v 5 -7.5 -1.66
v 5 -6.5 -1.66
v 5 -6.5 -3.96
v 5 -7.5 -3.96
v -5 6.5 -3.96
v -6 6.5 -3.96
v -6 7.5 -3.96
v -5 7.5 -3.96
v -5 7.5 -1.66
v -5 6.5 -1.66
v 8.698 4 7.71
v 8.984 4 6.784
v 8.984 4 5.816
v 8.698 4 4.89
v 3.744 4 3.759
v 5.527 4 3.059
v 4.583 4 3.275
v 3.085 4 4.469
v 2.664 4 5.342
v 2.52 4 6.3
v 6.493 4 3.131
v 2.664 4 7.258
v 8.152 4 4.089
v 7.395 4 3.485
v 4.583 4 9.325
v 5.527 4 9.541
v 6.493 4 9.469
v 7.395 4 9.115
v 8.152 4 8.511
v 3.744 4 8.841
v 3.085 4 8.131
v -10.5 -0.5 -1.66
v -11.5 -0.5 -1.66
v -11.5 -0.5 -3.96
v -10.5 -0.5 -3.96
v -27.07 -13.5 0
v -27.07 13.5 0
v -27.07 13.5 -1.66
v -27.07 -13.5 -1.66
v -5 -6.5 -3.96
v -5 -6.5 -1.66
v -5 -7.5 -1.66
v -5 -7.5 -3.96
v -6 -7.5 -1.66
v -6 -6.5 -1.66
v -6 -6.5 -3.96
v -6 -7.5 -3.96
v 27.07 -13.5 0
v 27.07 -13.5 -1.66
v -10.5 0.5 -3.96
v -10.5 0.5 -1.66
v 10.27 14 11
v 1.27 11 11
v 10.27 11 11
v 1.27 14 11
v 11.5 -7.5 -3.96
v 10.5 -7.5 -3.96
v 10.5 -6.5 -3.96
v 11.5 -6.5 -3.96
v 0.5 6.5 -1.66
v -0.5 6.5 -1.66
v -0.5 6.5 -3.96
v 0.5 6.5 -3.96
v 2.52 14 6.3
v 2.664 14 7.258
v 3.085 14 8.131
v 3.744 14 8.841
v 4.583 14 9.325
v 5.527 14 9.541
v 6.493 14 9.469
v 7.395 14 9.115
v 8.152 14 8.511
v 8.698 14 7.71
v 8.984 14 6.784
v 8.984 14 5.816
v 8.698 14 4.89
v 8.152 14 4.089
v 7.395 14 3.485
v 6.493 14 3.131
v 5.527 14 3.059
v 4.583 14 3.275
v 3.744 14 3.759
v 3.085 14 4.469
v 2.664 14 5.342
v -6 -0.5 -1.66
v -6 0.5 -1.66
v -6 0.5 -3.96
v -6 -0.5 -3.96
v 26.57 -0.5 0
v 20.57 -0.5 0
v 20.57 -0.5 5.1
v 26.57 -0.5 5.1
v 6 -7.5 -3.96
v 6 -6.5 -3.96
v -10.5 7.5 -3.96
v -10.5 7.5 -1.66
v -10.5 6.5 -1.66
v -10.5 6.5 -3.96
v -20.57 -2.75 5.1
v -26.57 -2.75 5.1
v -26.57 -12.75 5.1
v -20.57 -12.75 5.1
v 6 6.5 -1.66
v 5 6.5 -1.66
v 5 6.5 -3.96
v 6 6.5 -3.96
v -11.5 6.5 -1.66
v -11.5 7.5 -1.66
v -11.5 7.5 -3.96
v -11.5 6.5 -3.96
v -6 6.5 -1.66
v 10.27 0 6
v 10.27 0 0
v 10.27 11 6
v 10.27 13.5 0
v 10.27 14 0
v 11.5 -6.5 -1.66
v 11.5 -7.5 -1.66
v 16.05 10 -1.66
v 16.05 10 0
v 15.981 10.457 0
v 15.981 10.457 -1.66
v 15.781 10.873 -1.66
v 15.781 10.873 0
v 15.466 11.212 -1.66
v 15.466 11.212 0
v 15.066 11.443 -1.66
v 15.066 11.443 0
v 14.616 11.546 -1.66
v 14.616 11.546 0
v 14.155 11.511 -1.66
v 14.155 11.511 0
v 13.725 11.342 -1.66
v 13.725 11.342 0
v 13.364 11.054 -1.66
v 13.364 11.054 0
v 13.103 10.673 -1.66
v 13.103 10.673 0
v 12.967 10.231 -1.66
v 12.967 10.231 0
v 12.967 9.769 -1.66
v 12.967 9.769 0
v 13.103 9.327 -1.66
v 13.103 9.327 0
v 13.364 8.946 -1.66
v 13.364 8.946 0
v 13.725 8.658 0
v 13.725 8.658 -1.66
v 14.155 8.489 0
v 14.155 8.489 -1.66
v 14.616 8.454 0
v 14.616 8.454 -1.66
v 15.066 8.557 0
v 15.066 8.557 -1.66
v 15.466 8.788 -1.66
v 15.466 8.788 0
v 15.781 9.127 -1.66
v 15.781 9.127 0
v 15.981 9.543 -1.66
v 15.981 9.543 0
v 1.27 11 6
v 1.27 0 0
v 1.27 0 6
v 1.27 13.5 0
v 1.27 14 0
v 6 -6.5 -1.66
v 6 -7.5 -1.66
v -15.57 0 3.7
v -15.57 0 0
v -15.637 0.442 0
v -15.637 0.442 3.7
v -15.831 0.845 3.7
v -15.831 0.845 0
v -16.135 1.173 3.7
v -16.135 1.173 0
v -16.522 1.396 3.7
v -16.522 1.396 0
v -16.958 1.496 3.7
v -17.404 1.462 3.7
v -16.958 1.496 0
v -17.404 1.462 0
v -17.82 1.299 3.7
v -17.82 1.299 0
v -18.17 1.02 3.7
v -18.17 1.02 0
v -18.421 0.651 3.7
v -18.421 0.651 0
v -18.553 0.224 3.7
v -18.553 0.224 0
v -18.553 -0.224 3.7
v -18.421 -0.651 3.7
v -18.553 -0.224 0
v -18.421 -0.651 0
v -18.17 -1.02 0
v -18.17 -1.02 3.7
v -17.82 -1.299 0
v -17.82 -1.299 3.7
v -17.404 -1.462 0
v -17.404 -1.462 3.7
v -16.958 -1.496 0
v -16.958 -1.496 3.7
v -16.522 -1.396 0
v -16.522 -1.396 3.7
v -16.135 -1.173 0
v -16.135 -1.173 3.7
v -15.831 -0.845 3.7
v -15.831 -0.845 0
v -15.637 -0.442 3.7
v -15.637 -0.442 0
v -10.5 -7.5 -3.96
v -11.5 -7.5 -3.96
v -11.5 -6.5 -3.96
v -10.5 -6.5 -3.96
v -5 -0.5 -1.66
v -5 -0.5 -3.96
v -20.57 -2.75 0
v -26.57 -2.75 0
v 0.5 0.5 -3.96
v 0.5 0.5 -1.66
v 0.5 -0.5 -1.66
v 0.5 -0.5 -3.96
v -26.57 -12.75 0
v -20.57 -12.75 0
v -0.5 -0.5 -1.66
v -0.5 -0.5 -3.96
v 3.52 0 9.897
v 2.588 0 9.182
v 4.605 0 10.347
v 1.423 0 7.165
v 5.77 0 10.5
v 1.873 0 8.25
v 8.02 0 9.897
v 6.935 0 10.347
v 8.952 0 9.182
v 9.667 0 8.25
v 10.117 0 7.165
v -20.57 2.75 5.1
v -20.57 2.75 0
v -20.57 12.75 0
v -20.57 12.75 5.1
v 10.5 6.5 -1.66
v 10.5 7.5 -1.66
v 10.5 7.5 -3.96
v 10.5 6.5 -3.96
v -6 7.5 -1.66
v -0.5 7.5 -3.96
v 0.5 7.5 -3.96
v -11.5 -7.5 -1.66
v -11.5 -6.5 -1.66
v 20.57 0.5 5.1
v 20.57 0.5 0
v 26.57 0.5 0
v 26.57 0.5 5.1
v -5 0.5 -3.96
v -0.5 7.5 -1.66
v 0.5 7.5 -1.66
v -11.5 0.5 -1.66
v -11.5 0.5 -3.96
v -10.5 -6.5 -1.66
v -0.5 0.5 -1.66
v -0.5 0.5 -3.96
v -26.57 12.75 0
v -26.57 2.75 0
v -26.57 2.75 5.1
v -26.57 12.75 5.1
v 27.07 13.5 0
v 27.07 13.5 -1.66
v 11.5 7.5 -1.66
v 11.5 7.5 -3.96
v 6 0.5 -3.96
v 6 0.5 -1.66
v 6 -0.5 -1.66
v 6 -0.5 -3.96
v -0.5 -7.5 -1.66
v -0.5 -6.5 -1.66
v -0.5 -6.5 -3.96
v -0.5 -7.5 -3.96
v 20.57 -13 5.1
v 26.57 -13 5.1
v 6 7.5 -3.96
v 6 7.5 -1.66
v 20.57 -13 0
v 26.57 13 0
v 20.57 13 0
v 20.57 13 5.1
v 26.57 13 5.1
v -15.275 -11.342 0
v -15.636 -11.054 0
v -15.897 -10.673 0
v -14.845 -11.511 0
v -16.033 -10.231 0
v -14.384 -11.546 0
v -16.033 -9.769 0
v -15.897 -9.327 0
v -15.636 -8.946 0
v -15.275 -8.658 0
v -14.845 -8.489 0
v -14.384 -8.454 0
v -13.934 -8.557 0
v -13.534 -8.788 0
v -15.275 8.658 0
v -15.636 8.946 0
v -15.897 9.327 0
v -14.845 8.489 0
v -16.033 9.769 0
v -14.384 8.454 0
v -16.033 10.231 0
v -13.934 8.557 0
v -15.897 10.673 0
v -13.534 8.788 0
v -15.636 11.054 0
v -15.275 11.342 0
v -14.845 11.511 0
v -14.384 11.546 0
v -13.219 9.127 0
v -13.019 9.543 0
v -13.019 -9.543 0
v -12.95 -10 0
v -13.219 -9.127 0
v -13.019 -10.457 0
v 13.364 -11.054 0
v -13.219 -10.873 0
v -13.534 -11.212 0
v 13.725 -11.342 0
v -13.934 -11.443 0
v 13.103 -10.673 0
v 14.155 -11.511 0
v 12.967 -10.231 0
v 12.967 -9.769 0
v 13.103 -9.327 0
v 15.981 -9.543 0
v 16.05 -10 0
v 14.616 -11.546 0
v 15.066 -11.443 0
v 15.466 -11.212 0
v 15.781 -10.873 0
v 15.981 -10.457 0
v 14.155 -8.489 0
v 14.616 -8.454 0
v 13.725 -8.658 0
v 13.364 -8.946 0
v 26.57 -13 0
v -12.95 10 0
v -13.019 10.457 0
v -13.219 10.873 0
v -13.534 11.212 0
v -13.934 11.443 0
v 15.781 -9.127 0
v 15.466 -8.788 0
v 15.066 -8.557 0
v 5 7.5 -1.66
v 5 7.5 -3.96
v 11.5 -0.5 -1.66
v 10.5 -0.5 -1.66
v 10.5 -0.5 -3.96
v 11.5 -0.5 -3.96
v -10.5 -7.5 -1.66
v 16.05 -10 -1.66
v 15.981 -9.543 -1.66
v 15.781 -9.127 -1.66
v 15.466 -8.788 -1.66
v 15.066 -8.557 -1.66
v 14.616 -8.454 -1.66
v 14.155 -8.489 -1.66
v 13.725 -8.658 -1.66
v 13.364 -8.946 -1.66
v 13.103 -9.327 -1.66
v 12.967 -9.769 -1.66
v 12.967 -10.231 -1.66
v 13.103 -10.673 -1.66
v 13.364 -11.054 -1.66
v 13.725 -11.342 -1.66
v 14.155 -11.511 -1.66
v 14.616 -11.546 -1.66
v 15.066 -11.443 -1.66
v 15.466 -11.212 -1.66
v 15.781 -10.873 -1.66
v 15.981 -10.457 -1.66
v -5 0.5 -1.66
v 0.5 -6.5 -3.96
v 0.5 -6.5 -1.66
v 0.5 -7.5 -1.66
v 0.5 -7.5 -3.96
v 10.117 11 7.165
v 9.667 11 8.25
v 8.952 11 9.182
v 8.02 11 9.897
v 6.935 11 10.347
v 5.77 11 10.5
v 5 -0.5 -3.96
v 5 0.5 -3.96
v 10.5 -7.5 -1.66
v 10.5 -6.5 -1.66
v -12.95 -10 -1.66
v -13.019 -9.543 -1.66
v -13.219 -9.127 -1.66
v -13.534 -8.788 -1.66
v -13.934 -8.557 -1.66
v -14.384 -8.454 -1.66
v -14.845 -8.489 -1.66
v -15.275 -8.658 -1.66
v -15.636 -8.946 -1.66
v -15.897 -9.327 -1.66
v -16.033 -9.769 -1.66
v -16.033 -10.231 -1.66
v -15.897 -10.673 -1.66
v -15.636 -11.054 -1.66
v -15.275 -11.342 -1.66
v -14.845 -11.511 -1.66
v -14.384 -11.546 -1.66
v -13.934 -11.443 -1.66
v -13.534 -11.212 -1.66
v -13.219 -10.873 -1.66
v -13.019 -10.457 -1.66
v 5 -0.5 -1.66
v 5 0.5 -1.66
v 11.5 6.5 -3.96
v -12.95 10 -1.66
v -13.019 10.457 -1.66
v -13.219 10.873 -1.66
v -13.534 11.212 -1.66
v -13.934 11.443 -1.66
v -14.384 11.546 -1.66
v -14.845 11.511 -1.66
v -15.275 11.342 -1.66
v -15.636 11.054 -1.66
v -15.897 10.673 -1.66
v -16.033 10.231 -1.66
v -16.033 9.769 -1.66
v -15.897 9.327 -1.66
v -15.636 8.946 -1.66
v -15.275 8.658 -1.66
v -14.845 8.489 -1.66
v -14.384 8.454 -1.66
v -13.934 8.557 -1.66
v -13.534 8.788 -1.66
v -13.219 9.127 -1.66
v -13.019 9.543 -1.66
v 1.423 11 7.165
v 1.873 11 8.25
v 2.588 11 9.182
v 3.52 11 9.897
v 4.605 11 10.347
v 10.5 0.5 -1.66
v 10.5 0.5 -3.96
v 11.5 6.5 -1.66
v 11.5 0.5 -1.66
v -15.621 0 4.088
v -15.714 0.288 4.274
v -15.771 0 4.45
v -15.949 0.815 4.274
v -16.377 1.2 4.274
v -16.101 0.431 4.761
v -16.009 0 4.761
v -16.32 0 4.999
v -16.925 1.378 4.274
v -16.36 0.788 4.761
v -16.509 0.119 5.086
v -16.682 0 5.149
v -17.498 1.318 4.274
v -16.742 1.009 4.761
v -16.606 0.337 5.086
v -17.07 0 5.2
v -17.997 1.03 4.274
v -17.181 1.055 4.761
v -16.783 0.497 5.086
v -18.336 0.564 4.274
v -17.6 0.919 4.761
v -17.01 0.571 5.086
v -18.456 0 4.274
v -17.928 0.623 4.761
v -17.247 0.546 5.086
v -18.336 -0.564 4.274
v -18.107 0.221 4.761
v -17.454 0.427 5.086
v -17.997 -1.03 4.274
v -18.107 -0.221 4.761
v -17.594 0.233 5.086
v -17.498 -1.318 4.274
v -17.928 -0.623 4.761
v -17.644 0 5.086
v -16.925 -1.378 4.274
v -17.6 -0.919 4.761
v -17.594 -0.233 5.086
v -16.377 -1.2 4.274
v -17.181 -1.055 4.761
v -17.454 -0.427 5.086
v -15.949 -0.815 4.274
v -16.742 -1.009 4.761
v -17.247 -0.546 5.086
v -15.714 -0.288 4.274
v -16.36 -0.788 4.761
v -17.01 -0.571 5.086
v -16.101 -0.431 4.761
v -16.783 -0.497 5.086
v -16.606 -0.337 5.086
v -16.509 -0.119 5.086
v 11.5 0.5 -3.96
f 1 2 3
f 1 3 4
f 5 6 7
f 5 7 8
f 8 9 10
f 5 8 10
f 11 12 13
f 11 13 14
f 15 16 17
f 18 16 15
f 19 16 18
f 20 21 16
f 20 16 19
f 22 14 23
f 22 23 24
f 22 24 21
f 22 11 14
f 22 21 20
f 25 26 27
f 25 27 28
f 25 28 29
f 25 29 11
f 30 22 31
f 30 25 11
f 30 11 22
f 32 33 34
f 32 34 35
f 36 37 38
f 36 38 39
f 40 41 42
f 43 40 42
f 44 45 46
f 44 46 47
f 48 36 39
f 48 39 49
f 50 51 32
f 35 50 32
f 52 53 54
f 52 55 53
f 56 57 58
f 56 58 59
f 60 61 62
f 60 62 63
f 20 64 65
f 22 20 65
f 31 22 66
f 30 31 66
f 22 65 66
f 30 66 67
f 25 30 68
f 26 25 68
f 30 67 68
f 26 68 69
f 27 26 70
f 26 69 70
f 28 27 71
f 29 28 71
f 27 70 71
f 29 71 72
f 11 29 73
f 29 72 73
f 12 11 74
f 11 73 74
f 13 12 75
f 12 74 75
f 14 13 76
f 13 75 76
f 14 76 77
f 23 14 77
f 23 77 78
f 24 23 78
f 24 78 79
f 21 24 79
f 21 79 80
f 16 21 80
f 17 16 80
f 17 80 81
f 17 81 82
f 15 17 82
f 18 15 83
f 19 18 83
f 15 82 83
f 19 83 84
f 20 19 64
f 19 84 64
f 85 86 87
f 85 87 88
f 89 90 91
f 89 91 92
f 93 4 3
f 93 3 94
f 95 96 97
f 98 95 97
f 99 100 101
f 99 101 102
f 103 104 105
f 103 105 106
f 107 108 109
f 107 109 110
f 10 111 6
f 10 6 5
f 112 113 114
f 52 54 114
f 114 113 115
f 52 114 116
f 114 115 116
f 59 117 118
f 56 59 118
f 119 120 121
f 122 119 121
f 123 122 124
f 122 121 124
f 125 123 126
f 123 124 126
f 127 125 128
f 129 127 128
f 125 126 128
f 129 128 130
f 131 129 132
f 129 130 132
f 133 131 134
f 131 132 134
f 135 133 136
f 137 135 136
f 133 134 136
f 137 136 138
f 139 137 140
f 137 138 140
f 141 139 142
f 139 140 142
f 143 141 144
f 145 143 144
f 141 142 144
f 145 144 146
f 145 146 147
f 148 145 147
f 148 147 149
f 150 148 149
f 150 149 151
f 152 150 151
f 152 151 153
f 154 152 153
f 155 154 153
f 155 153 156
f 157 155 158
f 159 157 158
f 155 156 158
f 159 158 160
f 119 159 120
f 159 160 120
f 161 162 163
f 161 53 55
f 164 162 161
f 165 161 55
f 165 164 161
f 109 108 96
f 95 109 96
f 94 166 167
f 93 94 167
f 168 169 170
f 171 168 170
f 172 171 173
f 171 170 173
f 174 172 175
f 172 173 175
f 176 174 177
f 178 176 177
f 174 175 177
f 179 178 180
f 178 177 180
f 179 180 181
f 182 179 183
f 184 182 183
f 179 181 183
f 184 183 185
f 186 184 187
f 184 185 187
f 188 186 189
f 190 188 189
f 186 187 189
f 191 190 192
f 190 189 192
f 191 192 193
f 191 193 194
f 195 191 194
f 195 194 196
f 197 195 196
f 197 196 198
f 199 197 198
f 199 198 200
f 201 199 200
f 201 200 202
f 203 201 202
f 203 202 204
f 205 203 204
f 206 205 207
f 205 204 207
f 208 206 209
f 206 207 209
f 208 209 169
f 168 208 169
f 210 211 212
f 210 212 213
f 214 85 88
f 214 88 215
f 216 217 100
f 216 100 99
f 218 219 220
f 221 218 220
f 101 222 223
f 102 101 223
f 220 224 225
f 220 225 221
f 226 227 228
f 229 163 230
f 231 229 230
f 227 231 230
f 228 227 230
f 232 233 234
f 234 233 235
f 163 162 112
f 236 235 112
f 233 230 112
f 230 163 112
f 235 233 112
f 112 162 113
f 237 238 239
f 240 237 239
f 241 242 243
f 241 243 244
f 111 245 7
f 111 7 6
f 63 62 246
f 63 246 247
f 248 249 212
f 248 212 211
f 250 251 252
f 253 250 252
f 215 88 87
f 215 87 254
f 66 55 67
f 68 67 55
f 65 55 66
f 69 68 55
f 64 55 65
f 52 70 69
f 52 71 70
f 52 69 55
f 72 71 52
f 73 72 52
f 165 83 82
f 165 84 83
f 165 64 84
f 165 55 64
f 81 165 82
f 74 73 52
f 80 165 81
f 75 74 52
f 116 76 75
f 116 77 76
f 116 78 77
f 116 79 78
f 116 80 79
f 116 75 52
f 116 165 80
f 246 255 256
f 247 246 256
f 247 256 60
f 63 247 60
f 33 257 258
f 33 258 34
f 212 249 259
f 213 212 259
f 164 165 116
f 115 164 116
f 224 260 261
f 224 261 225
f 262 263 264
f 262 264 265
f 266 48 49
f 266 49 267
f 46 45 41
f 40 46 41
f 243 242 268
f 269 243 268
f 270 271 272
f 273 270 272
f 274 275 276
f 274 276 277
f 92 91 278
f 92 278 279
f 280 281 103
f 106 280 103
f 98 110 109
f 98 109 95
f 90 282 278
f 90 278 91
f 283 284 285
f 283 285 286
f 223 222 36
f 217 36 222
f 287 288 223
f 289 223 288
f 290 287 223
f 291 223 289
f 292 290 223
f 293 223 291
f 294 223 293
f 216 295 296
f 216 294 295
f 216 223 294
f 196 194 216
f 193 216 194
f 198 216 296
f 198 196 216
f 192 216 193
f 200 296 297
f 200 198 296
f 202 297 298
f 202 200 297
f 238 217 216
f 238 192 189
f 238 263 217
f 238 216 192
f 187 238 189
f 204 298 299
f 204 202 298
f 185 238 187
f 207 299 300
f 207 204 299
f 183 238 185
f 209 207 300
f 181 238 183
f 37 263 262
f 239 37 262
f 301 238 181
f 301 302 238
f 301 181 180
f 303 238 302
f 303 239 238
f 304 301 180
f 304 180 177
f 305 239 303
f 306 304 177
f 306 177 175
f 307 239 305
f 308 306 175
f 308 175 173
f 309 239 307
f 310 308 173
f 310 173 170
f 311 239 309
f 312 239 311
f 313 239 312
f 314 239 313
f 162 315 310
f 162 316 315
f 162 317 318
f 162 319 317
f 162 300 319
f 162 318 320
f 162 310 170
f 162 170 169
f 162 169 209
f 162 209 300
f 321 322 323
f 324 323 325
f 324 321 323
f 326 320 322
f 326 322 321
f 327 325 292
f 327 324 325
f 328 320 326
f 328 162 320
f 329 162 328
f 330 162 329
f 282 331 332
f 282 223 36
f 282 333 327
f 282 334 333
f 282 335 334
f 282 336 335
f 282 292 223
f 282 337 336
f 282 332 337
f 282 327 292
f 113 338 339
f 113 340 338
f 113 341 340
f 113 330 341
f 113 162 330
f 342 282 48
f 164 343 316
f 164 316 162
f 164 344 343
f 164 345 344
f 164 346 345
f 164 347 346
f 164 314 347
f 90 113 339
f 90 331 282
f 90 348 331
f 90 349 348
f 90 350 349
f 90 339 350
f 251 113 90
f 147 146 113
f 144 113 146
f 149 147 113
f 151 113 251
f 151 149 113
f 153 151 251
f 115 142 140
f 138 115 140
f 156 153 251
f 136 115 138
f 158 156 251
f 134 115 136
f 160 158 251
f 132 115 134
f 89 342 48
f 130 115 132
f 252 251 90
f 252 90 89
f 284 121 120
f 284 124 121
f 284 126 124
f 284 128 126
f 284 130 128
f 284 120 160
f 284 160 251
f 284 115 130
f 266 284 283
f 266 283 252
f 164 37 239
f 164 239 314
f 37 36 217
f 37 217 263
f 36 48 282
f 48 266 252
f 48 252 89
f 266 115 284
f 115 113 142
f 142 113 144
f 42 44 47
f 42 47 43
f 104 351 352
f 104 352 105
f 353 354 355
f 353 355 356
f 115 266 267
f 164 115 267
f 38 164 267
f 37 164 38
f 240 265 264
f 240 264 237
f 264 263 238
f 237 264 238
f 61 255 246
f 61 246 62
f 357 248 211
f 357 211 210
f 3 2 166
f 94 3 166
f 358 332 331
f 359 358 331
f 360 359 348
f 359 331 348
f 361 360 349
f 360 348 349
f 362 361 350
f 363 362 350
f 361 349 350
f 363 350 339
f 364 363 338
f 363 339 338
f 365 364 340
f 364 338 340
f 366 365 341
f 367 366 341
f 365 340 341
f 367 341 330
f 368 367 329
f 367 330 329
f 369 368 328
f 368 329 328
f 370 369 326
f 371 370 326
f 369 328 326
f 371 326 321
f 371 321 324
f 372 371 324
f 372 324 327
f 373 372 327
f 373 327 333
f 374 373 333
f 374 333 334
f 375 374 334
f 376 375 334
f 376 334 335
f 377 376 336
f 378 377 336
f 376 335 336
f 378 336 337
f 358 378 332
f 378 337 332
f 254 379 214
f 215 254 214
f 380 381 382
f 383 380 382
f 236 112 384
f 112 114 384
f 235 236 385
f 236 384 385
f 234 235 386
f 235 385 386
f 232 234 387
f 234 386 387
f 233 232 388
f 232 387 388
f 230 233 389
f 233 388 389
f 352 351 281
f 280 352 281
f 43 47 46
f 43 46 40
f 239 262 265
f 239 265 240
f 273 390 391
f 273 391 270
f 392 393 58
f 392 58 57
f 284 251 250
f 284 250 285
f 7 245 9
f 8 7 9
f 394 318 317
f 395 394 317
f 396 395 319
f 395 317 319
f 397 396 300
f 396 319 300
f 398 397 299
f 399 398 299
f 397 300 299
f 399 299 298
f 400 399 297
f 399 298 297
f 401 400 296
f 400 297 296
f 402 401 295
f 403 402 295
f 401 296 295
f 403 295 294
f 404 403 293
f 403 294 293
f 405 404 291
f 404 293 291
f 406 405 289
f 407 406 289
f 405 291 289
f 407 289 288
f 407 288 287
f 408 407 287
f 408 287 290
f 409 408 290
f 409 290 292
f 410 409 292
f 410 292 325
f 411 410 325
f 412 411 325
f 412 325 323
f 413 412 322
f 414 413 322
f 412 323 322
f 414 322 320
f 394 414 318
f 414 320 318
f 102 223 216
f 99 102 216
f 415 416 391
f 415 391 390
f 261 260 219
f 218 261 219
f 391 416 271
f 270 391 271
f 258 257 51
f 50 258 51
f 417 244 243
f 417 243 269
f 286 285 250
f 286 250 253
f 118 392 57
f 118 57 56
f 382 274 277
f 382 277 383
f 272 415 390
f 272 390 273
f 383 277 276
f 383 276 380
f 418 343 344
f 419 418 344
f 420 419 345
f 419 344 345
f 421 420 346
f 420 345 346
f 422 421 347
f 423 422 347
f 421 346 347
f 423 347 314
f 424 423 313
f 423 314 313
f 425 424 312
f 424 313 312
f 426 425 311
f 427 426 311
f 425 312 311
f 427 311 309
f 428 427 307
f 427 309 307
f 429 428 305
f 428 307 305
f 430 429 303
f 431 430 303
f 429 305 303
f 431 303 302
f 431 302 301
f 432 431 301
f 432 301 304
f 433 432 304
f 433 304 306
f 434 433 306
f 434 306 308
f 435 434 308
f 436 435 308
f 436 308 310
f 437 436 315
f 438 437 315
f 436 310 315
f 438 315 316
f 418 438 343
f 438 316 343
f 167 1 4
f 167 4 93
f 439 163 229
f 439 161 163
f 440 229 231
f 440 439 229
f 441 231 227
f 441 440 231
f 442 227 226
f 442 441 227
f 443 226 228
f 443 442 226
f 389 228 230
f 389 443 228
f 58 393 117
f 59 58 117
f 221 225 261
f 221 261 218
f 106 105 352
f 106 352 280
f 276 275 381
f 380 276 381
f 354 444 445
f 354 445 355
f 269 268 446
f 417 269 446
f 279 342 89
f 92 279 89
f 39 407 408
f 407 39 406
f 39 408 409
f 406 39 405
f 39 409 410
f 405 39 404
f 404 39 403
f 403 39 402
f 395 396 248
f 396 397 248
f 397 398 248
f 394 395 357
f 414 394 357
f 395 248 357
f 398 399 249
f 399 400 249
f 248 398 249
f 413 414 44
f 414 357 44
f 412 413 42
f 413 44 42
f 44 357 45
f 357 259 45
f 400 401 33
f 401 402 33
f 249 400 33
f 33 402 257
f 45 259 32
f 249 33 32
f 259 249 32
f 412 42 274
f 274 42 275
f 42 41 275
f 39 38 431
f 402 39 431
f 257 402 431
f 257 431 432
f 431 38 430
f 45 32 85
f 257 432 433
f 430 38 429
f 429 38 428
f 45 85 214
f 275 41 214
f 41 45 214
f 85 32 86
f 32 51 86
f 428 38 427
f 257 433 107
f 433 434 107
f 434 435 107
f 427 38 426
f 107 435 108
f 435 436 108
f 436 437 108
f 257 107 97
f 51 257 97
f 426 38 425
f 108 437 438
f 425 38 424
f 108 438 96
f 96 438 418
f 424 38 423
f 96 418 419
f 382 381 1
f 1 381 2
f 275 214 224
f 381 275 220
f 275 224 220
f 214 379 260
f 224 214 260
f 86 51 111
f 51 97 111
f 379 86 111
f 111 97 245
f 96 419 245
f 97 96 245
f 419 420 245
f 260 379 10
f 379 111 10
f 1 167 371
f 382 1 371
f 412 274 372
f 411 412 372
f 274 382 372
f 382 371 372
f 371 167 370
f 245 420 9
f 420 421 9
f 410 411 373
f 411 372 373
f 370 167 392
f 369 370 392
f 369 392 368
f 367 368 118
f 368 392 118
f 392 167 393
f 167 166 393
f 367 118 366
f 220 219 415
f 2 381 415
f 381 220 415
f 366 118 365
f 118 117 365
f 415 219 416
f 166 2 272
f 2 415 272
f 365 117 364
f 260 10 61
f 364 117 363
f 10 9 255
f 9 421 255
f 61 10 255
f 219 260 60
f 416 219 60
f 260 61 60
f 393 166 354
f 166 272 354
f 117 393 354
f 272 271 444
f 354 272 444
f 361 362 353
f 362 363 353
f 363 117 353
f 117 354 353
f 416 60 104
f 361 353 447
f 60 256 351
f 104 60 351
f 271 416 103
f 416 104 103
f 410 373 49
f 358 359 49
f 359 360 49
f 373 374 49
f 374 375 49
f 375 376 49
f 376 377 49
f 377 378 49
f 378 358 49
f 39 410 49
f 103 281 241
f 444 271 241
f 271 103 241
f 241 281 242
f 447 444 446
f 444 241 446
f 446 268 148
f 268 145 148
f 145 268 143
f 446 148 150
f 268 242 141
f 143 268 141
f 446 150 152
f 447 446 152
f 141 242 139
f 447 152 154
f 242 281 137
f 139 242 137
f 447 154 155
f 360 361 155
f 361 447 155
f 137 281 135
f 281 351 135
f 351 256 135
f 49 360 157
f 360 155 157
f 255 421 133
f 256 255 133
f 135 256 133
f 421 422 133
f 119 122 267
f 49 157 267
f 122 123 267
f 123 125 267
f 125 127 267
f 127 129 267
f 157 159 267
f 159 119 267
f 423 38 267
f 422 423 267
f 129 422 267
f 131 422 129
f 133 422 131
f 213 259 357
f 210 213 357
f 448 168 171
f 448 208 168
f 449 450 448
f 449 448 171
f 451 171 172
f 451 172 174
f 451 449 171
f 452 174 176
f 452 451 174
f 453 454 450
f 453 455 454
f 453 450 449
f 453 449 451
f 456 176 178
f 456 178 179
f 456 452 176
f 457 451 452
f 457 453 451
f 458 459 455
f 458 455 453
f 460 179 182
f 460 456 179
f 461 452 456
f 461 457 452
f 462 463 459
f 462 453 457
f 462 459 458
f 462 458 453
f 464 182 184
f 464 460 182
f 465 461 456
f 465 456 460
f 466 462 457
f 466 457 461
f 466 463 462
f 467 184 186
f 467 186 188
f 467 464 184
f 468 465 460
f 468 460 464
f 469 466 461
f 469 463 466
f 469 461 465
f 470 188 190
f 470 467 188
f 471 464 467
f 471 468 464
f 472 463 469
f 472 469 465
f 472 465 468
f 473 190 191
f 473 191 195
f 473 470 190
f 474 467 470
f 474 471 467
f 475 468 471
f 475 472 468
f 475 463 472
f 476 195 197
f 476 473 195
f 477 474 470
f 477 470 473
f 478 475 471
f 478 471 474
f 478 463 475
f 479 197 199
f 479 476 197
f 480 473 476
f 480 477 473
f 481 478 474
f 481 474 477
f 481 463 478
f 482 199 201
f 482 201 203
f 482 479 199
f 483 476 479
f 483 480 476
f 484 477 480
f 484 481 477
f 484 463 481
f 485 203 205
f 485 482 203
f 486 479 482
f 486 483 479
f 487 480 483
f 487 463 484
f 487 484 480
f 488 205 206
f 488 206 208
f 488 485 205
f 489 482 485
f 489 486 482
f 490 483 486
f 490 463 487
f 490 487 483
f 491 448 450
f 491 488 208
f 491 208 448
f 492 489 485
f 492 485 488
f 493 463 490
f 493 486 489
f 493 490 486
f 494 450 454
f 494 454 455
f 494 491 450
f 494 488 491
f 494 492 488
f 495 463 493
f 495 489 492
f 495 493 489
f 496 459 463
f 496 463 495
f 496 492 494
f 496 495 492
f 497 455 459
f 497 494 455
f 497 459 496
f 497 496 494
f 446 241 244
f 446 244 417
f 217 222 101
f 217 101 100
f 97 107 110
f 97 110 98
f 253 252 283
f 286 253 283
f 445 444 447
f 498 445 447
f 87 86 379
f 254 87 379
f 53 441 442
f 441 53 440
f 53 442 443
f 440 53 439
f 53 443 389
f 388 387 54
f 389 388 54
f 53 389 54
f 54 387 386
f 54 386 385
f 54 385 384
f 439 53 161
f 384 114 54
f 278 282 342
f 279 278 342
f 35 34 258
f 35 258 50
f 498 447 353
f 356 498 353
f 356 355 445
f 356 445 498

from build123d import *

# Parameters (mm, degrees)
F0_W      = 6
F0_H      = 10
F0_R      = 1.55
F0_R_2    = 1.5
F0_W_2    = 10
F0_H_2    = 22
F0_H_3    = 12.5
F0_W_3    = 9
F0_H_4    = 11
F0_H_5    = 2.5
F1_DEPTH  = 1.66
F0_H_6    = 0.5
F2_DEPTH  = 11
F3_DEPTH  = 10.5
F4_R      = 4.49999
F5_R      = 3.25
F6_DEPTH  = 10
F7_DEPTH  = 5.2
F8_R      = 1.5
F9_DEPTH  = 5.1
F10_W     = 1
F10_H     = 1
F11_DEPTH = 2.3


# Not quite as in the source:
# - a fillet or chamfer is up to 0.001 mm smaller than in the source, because OpenCascade refuses the exact size


with BuildPart() as f1:
    # F0 (on Top) → F1 (new body)
    with BuildSketch(Plane.XY):
        Polygon((-27.07, -13.5), (27.07, -13.5), (27.07, 13.5), (10.27, 13.5), (10.27, 11), (10.27, 0), (1.27, 0), (1.27, 11), (1.27, 13.5), (-27.07, 13.5), align=None)
        with Locations((-23.57, -7.75)):
            Rectangle(F0_W, F0_H, mode=Mode.SUBTRACT)
        with Locations((-14.5, -10)):
            Circle(F0_R, mode=Mode.SUBTRACT)
        with Locations((-17.07, 0)):
            Circle(F0_R_2, mode=Mode.SUBTRACT)
        with Locations((-6.07, 0)):
            Rectangle(F0_W_2, F0_H_2, mode=Mode.SUBTRACT)
        with Locations((14.5, -10)):
            Circle(F0_R, mode=Mode.SUBTRACT)
        with Locations((23.57, -6.75)):
            Rectangle(F0_W, F0_H_3, mode=Mode.SUBTRACT)
        with Locations((-23.57, 7.75)):
            Rectangle(F0_W, F0_H, mode=Mode.SUBTRACT)
        with Locations((-14.5, 10)):
            Circle(F0_R, mode=Mode.SUBTRACT)
        with Locations((23.57, 6.75)):
            Rectangle(F0_W, F0_H_3, mode=Mode.SUBTRACT)
        with Locations((14.5, 10)):
            Circle(F0_R, mode=Mode.SUBTRACT)
        with Locations((-6.07, 0)):
            Rectangle(F0_W_2, F0_H_2)
        with Locations((5.77, 5.5)):
            Rectangle(F0_W_3, F0_H_4)
        with Locations((23.57, 6.75)):
            Rectangle(F0_W, F0_H_3)
        with Locations((23.57, -6.75)):
            Rectangle(F0_W, F0_H_3)
        with Locations((-23.57, 7.75)):
            Rectangle(F0_W, F0_H)
        with Locations((-23.57, -7.75)):
            Rectangle(F0_W, F0_H)
        with Locations((5.77, 12.25)):
            Rectangle(F0_W_3, F0_H_5)
        with Locations((-17.07, 0)):
            Circle(F0_R_2)
    extrude(amount=-F1_DEPTH)

    # F0 (on Top) → F2 (join)
    with BuildSketch(Plane.XY):
        with Locations((5.77, 12.25)):
            Rectangle(F0_W_3, F0_H_5)
        with Locations((5.77, 13.75)):
            Rectangle(F0_W_3, F0_H_6)
    extrude(amount=F2_DEPTH)

    # F0 (on Top) → F3 (join)
    with BuildSketch(Plane.XY):
        with Locations((5.77, 5.5)):
            Rectangle(F0_W_3, F0_H_4)
    extrude(amount=F3_DEPTH)

    # F4 (radius 4.5 in the source; OpenCascade refuses exactly that, so slightly less here)
    f4_edges = [f1.edges().sort_by_distance(p)[0] for p in [
        (1.27, 5.5, 10.5),
        (10.27, 5.5, 10.5),
    ]]
    fillet(f4_edges, radius=F4_R)

    # F5 (on face) → F6 (cut)
    with BuildSketch(Plane(origin=(0, 14, 0), x_dir=(-1, 0, 0), z_dir=(0, 1, 0))):
        with Locations((-5.77, 6.3)):
            Circle(F5_R)
    extrude(amount=-F6_DEPTH, mode=Mode.SUBTRACT)

    # F0 (on Top) → F7 (join)
    with BuildSketch(Plane.XY):
        with Locations((-17.07, 0)):
            Circle(F0_R_2)
    extrude(amount=F7_DEPTH)

    # F8
    f8_edges = [f1.edges().sort_by_distance(p)[0] for p in [
        (-18.57, 0, 5.2),
    ]]
    fillet(f8_edges, radius=F8_R)

    # F0 (on Top) → F9 (join)
    with BuildSketch(Plane.XY):
        with Locations((23.57, 6.75)):
            Rectangle(F0_W, F0_H_3)
        with Locations((23.57, -6.75)):
            Rectangle(F0_W, F0_H_3)
        with Locations((-23.57, -7.75)):
            Rectangle(F0_W, F0_H)
        with Locations((-23.57, 7.75)):
            Rectangle(F0_W, F0_H)
    extrude(amount=F9_DEPTH)

    # F10 (on face) → F11 (join)
    with BuildSketch(Plane(origin=(0, 0, -1.66), x_dir=(1, 0, 0), z_dir=(0, 0, -1))):
        Rectangle(F10_W, F10_H)
        with Locations((0, 7)):
            Rectangle(F10_W, F10_H)
        with Locations((5.5, 7)):
            Rectangle(F10_W, F10_H)
        with Locations((11, 7)):
            Rectangle(F10_W, F10_H)
        with Locations((11, 0)):
            Rectangle(F10_W, F10_H)
        with Locations((5.5, 0)):
            Rectangle(F10_W, F10_H)
        with Locations((11, -7)):
            Rectangle(F10_W, F10_H)
        with Locations((5.5, -7)):
            Rectangle(F10_W, F10_H)
        with Locations((0, -7)):
            Rectangle(F10_W, F10_H)
        with Locations((-5.5, -7)):
            Rectangle(F10_W, F10_H)
        with Locations((-5.5, 0)):
            Rectangle(F10_W, F10_H)
        with Locations((-5.5, 7)):
            Rectangle(F10_W, F10_H)
        with Locations((-11, 7)):
            Rectangle(F10_W, F10_H)
        with Locations((-11, 0)):
            Rectangle(F10_W, F10_H)
        with Locations((-11, -7)):
            Rectangle(F10_W, F10_H)
    extrude(amount=F11_DEPTH)


solid = f1.part
